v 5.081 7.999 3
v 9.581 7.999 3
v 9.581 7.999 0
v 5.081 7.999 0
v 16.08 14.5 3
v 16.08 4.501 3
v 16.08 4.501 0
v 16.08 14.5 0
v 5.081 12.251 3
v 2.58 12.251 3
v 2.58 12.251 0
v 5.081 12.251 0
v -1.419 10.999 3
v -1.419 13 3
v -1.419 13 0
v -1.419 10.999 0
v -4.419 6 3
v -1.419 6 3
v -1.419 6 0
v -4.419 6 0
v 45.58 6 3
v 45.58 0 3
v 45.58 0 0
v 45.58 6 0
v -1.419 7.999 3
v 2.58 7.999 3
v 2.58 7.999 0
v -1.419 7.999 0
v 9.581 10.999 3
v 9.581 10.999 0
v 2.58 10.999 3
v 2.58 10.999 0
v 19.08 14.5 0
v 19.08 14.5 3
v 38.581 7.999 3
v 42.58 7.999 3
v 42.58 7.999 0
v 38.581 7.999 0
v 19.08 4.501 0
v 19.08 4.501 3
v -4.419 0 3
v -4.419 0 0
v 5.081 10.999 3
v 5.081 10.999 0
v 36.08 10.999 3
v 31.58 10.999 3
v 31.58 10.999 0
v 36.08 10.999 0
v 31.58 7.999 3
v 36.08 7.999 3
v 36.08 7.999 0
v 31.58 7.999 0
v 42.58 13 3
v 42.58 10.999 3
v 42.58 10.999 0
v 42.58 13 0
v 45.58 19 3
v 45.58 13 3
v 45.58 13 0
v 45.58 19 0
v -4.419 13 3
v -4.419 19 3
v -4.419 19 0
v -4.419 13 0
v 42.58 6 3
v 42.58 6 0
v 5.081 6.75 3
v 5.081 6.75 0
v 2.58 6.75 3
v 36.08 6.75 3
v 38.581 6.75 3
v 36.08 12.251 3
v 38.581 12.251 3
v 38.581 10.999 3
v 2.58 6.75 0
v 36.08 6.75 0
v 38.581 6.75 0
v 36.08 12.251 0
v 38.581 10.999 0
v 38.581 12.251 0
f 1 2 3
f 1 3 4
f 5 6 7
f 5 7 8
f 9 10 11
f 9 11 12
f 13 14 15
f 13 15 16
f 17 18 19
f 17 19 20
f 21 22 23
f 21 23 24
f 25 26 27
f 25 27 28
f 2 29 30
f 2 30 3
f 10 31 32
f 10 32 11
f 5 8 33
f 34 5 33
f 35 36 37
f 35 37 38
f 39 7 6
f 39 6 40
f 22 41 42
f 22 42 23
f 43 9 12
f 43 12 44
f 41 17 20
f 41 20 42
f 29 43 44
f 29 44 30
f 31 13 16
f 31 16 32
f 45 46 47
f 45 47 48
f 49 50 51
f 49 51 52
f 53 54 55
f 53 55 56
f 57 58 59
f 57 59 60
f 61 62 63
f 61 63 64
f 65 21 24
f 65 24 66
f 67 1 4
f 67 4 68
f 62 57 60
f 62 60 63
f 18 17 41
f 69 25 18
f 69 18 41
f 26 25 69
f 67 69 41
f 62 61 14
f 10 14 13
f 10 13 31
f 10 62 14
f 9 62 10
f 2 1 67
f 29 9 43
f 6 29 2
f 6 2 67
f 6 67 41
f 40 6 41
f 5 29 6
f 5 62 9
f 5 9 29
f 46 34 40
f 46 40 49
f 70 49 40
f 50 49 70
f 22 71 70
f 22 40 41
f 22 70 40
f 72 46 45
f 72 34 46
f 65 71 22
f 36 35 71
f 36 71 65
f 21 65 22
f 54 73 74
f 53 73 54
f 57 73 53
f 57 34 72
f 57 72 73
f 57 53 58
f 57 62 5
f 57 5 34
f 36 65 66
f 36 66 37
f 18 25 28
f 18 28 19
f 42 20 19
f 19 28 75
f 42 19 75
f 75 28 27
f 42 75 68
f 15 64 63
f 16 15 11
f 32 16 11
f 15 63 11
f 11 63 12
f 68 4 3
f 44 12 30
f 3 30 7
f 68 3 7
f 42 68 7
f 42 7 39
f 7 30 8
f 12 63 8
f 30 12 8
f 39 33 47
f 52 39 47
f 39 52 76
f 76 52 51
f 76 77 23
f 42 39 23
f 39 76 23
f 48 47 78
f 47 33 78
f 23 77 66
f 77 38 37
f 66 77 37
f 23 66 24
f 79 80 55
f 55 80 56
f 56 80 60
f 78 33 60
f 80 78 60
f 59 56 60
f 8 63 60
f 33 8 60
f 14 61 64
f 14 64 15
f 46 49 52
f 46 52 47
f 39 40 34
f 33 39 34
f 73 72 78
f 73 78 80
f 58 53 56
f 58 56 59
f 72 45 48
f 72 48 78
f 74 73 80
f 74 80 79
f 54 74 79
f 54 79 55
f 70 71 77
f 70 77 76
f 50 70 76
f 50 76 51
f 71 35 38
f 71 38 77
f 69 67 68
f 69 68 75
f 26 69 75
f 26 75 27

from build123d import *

# Parameters (mm, degrees)
SKETCH_1_W      = 2.9999
SKETCH_1_H      = 9.999
EXTRUDE_1_DEPTH = 3


with BuildPart() as part:
    # 草图1 → 凸台-拉伸1 (new body)
    with BuildSketch(Plane.XY.offset(3)):
        Polygon((42.580009157, 5.99999), (42.580009157, 7.99949), (38.581009157, 7.99949), (38.581009157, 6.74959), (36.079809157, 6.74959), (36.079809157, 7.99949), (31.580009157, 7.99949), (31.580009157, 10.99949), (36.079809157, 10.99949), (36.079809157, 12.25079), (38.581009157, 12.25079), (38.581009157, 10.99949), (42.580009157, 10.99949), (42.580009157, 13.00039), (45.579909157, 13.00039), (45.579909157, 19.000390002), (-4.419390843, 19.000390002), (-4.419390843, 13.00039), (-1.419350843, 13.00039), (-1.419350843, 10.99949), (2.579649157, 10.99949), (2.579649157, 12.25079), (5.080849157, 12.25079), (5.080849157, 10.99949), (9.580649157, 10.99949), (9.580649157, 7.99949), (5.080849157, 7.99949), (5.080849157, 6.74959), (2.579649157, 6.74959), (2.579649157, 7.99949), (-1.419350843, 7.99949), (-1.419350843, 5.99999), (-4.419250843, 5.99999), (-4.419250843, -2e-09), (45.580189157, -2e-09), (45.580189157, 5.99999), align=None)
        with Locations((17.580299157, 9.50019)):
            Rectangle(SKETCH_1_W, SKETCH_1_H, mode=Mode.SUBTRACT)
    extrude(amount=-EXTRUDE_1_DEPTH)


solid = part.part
